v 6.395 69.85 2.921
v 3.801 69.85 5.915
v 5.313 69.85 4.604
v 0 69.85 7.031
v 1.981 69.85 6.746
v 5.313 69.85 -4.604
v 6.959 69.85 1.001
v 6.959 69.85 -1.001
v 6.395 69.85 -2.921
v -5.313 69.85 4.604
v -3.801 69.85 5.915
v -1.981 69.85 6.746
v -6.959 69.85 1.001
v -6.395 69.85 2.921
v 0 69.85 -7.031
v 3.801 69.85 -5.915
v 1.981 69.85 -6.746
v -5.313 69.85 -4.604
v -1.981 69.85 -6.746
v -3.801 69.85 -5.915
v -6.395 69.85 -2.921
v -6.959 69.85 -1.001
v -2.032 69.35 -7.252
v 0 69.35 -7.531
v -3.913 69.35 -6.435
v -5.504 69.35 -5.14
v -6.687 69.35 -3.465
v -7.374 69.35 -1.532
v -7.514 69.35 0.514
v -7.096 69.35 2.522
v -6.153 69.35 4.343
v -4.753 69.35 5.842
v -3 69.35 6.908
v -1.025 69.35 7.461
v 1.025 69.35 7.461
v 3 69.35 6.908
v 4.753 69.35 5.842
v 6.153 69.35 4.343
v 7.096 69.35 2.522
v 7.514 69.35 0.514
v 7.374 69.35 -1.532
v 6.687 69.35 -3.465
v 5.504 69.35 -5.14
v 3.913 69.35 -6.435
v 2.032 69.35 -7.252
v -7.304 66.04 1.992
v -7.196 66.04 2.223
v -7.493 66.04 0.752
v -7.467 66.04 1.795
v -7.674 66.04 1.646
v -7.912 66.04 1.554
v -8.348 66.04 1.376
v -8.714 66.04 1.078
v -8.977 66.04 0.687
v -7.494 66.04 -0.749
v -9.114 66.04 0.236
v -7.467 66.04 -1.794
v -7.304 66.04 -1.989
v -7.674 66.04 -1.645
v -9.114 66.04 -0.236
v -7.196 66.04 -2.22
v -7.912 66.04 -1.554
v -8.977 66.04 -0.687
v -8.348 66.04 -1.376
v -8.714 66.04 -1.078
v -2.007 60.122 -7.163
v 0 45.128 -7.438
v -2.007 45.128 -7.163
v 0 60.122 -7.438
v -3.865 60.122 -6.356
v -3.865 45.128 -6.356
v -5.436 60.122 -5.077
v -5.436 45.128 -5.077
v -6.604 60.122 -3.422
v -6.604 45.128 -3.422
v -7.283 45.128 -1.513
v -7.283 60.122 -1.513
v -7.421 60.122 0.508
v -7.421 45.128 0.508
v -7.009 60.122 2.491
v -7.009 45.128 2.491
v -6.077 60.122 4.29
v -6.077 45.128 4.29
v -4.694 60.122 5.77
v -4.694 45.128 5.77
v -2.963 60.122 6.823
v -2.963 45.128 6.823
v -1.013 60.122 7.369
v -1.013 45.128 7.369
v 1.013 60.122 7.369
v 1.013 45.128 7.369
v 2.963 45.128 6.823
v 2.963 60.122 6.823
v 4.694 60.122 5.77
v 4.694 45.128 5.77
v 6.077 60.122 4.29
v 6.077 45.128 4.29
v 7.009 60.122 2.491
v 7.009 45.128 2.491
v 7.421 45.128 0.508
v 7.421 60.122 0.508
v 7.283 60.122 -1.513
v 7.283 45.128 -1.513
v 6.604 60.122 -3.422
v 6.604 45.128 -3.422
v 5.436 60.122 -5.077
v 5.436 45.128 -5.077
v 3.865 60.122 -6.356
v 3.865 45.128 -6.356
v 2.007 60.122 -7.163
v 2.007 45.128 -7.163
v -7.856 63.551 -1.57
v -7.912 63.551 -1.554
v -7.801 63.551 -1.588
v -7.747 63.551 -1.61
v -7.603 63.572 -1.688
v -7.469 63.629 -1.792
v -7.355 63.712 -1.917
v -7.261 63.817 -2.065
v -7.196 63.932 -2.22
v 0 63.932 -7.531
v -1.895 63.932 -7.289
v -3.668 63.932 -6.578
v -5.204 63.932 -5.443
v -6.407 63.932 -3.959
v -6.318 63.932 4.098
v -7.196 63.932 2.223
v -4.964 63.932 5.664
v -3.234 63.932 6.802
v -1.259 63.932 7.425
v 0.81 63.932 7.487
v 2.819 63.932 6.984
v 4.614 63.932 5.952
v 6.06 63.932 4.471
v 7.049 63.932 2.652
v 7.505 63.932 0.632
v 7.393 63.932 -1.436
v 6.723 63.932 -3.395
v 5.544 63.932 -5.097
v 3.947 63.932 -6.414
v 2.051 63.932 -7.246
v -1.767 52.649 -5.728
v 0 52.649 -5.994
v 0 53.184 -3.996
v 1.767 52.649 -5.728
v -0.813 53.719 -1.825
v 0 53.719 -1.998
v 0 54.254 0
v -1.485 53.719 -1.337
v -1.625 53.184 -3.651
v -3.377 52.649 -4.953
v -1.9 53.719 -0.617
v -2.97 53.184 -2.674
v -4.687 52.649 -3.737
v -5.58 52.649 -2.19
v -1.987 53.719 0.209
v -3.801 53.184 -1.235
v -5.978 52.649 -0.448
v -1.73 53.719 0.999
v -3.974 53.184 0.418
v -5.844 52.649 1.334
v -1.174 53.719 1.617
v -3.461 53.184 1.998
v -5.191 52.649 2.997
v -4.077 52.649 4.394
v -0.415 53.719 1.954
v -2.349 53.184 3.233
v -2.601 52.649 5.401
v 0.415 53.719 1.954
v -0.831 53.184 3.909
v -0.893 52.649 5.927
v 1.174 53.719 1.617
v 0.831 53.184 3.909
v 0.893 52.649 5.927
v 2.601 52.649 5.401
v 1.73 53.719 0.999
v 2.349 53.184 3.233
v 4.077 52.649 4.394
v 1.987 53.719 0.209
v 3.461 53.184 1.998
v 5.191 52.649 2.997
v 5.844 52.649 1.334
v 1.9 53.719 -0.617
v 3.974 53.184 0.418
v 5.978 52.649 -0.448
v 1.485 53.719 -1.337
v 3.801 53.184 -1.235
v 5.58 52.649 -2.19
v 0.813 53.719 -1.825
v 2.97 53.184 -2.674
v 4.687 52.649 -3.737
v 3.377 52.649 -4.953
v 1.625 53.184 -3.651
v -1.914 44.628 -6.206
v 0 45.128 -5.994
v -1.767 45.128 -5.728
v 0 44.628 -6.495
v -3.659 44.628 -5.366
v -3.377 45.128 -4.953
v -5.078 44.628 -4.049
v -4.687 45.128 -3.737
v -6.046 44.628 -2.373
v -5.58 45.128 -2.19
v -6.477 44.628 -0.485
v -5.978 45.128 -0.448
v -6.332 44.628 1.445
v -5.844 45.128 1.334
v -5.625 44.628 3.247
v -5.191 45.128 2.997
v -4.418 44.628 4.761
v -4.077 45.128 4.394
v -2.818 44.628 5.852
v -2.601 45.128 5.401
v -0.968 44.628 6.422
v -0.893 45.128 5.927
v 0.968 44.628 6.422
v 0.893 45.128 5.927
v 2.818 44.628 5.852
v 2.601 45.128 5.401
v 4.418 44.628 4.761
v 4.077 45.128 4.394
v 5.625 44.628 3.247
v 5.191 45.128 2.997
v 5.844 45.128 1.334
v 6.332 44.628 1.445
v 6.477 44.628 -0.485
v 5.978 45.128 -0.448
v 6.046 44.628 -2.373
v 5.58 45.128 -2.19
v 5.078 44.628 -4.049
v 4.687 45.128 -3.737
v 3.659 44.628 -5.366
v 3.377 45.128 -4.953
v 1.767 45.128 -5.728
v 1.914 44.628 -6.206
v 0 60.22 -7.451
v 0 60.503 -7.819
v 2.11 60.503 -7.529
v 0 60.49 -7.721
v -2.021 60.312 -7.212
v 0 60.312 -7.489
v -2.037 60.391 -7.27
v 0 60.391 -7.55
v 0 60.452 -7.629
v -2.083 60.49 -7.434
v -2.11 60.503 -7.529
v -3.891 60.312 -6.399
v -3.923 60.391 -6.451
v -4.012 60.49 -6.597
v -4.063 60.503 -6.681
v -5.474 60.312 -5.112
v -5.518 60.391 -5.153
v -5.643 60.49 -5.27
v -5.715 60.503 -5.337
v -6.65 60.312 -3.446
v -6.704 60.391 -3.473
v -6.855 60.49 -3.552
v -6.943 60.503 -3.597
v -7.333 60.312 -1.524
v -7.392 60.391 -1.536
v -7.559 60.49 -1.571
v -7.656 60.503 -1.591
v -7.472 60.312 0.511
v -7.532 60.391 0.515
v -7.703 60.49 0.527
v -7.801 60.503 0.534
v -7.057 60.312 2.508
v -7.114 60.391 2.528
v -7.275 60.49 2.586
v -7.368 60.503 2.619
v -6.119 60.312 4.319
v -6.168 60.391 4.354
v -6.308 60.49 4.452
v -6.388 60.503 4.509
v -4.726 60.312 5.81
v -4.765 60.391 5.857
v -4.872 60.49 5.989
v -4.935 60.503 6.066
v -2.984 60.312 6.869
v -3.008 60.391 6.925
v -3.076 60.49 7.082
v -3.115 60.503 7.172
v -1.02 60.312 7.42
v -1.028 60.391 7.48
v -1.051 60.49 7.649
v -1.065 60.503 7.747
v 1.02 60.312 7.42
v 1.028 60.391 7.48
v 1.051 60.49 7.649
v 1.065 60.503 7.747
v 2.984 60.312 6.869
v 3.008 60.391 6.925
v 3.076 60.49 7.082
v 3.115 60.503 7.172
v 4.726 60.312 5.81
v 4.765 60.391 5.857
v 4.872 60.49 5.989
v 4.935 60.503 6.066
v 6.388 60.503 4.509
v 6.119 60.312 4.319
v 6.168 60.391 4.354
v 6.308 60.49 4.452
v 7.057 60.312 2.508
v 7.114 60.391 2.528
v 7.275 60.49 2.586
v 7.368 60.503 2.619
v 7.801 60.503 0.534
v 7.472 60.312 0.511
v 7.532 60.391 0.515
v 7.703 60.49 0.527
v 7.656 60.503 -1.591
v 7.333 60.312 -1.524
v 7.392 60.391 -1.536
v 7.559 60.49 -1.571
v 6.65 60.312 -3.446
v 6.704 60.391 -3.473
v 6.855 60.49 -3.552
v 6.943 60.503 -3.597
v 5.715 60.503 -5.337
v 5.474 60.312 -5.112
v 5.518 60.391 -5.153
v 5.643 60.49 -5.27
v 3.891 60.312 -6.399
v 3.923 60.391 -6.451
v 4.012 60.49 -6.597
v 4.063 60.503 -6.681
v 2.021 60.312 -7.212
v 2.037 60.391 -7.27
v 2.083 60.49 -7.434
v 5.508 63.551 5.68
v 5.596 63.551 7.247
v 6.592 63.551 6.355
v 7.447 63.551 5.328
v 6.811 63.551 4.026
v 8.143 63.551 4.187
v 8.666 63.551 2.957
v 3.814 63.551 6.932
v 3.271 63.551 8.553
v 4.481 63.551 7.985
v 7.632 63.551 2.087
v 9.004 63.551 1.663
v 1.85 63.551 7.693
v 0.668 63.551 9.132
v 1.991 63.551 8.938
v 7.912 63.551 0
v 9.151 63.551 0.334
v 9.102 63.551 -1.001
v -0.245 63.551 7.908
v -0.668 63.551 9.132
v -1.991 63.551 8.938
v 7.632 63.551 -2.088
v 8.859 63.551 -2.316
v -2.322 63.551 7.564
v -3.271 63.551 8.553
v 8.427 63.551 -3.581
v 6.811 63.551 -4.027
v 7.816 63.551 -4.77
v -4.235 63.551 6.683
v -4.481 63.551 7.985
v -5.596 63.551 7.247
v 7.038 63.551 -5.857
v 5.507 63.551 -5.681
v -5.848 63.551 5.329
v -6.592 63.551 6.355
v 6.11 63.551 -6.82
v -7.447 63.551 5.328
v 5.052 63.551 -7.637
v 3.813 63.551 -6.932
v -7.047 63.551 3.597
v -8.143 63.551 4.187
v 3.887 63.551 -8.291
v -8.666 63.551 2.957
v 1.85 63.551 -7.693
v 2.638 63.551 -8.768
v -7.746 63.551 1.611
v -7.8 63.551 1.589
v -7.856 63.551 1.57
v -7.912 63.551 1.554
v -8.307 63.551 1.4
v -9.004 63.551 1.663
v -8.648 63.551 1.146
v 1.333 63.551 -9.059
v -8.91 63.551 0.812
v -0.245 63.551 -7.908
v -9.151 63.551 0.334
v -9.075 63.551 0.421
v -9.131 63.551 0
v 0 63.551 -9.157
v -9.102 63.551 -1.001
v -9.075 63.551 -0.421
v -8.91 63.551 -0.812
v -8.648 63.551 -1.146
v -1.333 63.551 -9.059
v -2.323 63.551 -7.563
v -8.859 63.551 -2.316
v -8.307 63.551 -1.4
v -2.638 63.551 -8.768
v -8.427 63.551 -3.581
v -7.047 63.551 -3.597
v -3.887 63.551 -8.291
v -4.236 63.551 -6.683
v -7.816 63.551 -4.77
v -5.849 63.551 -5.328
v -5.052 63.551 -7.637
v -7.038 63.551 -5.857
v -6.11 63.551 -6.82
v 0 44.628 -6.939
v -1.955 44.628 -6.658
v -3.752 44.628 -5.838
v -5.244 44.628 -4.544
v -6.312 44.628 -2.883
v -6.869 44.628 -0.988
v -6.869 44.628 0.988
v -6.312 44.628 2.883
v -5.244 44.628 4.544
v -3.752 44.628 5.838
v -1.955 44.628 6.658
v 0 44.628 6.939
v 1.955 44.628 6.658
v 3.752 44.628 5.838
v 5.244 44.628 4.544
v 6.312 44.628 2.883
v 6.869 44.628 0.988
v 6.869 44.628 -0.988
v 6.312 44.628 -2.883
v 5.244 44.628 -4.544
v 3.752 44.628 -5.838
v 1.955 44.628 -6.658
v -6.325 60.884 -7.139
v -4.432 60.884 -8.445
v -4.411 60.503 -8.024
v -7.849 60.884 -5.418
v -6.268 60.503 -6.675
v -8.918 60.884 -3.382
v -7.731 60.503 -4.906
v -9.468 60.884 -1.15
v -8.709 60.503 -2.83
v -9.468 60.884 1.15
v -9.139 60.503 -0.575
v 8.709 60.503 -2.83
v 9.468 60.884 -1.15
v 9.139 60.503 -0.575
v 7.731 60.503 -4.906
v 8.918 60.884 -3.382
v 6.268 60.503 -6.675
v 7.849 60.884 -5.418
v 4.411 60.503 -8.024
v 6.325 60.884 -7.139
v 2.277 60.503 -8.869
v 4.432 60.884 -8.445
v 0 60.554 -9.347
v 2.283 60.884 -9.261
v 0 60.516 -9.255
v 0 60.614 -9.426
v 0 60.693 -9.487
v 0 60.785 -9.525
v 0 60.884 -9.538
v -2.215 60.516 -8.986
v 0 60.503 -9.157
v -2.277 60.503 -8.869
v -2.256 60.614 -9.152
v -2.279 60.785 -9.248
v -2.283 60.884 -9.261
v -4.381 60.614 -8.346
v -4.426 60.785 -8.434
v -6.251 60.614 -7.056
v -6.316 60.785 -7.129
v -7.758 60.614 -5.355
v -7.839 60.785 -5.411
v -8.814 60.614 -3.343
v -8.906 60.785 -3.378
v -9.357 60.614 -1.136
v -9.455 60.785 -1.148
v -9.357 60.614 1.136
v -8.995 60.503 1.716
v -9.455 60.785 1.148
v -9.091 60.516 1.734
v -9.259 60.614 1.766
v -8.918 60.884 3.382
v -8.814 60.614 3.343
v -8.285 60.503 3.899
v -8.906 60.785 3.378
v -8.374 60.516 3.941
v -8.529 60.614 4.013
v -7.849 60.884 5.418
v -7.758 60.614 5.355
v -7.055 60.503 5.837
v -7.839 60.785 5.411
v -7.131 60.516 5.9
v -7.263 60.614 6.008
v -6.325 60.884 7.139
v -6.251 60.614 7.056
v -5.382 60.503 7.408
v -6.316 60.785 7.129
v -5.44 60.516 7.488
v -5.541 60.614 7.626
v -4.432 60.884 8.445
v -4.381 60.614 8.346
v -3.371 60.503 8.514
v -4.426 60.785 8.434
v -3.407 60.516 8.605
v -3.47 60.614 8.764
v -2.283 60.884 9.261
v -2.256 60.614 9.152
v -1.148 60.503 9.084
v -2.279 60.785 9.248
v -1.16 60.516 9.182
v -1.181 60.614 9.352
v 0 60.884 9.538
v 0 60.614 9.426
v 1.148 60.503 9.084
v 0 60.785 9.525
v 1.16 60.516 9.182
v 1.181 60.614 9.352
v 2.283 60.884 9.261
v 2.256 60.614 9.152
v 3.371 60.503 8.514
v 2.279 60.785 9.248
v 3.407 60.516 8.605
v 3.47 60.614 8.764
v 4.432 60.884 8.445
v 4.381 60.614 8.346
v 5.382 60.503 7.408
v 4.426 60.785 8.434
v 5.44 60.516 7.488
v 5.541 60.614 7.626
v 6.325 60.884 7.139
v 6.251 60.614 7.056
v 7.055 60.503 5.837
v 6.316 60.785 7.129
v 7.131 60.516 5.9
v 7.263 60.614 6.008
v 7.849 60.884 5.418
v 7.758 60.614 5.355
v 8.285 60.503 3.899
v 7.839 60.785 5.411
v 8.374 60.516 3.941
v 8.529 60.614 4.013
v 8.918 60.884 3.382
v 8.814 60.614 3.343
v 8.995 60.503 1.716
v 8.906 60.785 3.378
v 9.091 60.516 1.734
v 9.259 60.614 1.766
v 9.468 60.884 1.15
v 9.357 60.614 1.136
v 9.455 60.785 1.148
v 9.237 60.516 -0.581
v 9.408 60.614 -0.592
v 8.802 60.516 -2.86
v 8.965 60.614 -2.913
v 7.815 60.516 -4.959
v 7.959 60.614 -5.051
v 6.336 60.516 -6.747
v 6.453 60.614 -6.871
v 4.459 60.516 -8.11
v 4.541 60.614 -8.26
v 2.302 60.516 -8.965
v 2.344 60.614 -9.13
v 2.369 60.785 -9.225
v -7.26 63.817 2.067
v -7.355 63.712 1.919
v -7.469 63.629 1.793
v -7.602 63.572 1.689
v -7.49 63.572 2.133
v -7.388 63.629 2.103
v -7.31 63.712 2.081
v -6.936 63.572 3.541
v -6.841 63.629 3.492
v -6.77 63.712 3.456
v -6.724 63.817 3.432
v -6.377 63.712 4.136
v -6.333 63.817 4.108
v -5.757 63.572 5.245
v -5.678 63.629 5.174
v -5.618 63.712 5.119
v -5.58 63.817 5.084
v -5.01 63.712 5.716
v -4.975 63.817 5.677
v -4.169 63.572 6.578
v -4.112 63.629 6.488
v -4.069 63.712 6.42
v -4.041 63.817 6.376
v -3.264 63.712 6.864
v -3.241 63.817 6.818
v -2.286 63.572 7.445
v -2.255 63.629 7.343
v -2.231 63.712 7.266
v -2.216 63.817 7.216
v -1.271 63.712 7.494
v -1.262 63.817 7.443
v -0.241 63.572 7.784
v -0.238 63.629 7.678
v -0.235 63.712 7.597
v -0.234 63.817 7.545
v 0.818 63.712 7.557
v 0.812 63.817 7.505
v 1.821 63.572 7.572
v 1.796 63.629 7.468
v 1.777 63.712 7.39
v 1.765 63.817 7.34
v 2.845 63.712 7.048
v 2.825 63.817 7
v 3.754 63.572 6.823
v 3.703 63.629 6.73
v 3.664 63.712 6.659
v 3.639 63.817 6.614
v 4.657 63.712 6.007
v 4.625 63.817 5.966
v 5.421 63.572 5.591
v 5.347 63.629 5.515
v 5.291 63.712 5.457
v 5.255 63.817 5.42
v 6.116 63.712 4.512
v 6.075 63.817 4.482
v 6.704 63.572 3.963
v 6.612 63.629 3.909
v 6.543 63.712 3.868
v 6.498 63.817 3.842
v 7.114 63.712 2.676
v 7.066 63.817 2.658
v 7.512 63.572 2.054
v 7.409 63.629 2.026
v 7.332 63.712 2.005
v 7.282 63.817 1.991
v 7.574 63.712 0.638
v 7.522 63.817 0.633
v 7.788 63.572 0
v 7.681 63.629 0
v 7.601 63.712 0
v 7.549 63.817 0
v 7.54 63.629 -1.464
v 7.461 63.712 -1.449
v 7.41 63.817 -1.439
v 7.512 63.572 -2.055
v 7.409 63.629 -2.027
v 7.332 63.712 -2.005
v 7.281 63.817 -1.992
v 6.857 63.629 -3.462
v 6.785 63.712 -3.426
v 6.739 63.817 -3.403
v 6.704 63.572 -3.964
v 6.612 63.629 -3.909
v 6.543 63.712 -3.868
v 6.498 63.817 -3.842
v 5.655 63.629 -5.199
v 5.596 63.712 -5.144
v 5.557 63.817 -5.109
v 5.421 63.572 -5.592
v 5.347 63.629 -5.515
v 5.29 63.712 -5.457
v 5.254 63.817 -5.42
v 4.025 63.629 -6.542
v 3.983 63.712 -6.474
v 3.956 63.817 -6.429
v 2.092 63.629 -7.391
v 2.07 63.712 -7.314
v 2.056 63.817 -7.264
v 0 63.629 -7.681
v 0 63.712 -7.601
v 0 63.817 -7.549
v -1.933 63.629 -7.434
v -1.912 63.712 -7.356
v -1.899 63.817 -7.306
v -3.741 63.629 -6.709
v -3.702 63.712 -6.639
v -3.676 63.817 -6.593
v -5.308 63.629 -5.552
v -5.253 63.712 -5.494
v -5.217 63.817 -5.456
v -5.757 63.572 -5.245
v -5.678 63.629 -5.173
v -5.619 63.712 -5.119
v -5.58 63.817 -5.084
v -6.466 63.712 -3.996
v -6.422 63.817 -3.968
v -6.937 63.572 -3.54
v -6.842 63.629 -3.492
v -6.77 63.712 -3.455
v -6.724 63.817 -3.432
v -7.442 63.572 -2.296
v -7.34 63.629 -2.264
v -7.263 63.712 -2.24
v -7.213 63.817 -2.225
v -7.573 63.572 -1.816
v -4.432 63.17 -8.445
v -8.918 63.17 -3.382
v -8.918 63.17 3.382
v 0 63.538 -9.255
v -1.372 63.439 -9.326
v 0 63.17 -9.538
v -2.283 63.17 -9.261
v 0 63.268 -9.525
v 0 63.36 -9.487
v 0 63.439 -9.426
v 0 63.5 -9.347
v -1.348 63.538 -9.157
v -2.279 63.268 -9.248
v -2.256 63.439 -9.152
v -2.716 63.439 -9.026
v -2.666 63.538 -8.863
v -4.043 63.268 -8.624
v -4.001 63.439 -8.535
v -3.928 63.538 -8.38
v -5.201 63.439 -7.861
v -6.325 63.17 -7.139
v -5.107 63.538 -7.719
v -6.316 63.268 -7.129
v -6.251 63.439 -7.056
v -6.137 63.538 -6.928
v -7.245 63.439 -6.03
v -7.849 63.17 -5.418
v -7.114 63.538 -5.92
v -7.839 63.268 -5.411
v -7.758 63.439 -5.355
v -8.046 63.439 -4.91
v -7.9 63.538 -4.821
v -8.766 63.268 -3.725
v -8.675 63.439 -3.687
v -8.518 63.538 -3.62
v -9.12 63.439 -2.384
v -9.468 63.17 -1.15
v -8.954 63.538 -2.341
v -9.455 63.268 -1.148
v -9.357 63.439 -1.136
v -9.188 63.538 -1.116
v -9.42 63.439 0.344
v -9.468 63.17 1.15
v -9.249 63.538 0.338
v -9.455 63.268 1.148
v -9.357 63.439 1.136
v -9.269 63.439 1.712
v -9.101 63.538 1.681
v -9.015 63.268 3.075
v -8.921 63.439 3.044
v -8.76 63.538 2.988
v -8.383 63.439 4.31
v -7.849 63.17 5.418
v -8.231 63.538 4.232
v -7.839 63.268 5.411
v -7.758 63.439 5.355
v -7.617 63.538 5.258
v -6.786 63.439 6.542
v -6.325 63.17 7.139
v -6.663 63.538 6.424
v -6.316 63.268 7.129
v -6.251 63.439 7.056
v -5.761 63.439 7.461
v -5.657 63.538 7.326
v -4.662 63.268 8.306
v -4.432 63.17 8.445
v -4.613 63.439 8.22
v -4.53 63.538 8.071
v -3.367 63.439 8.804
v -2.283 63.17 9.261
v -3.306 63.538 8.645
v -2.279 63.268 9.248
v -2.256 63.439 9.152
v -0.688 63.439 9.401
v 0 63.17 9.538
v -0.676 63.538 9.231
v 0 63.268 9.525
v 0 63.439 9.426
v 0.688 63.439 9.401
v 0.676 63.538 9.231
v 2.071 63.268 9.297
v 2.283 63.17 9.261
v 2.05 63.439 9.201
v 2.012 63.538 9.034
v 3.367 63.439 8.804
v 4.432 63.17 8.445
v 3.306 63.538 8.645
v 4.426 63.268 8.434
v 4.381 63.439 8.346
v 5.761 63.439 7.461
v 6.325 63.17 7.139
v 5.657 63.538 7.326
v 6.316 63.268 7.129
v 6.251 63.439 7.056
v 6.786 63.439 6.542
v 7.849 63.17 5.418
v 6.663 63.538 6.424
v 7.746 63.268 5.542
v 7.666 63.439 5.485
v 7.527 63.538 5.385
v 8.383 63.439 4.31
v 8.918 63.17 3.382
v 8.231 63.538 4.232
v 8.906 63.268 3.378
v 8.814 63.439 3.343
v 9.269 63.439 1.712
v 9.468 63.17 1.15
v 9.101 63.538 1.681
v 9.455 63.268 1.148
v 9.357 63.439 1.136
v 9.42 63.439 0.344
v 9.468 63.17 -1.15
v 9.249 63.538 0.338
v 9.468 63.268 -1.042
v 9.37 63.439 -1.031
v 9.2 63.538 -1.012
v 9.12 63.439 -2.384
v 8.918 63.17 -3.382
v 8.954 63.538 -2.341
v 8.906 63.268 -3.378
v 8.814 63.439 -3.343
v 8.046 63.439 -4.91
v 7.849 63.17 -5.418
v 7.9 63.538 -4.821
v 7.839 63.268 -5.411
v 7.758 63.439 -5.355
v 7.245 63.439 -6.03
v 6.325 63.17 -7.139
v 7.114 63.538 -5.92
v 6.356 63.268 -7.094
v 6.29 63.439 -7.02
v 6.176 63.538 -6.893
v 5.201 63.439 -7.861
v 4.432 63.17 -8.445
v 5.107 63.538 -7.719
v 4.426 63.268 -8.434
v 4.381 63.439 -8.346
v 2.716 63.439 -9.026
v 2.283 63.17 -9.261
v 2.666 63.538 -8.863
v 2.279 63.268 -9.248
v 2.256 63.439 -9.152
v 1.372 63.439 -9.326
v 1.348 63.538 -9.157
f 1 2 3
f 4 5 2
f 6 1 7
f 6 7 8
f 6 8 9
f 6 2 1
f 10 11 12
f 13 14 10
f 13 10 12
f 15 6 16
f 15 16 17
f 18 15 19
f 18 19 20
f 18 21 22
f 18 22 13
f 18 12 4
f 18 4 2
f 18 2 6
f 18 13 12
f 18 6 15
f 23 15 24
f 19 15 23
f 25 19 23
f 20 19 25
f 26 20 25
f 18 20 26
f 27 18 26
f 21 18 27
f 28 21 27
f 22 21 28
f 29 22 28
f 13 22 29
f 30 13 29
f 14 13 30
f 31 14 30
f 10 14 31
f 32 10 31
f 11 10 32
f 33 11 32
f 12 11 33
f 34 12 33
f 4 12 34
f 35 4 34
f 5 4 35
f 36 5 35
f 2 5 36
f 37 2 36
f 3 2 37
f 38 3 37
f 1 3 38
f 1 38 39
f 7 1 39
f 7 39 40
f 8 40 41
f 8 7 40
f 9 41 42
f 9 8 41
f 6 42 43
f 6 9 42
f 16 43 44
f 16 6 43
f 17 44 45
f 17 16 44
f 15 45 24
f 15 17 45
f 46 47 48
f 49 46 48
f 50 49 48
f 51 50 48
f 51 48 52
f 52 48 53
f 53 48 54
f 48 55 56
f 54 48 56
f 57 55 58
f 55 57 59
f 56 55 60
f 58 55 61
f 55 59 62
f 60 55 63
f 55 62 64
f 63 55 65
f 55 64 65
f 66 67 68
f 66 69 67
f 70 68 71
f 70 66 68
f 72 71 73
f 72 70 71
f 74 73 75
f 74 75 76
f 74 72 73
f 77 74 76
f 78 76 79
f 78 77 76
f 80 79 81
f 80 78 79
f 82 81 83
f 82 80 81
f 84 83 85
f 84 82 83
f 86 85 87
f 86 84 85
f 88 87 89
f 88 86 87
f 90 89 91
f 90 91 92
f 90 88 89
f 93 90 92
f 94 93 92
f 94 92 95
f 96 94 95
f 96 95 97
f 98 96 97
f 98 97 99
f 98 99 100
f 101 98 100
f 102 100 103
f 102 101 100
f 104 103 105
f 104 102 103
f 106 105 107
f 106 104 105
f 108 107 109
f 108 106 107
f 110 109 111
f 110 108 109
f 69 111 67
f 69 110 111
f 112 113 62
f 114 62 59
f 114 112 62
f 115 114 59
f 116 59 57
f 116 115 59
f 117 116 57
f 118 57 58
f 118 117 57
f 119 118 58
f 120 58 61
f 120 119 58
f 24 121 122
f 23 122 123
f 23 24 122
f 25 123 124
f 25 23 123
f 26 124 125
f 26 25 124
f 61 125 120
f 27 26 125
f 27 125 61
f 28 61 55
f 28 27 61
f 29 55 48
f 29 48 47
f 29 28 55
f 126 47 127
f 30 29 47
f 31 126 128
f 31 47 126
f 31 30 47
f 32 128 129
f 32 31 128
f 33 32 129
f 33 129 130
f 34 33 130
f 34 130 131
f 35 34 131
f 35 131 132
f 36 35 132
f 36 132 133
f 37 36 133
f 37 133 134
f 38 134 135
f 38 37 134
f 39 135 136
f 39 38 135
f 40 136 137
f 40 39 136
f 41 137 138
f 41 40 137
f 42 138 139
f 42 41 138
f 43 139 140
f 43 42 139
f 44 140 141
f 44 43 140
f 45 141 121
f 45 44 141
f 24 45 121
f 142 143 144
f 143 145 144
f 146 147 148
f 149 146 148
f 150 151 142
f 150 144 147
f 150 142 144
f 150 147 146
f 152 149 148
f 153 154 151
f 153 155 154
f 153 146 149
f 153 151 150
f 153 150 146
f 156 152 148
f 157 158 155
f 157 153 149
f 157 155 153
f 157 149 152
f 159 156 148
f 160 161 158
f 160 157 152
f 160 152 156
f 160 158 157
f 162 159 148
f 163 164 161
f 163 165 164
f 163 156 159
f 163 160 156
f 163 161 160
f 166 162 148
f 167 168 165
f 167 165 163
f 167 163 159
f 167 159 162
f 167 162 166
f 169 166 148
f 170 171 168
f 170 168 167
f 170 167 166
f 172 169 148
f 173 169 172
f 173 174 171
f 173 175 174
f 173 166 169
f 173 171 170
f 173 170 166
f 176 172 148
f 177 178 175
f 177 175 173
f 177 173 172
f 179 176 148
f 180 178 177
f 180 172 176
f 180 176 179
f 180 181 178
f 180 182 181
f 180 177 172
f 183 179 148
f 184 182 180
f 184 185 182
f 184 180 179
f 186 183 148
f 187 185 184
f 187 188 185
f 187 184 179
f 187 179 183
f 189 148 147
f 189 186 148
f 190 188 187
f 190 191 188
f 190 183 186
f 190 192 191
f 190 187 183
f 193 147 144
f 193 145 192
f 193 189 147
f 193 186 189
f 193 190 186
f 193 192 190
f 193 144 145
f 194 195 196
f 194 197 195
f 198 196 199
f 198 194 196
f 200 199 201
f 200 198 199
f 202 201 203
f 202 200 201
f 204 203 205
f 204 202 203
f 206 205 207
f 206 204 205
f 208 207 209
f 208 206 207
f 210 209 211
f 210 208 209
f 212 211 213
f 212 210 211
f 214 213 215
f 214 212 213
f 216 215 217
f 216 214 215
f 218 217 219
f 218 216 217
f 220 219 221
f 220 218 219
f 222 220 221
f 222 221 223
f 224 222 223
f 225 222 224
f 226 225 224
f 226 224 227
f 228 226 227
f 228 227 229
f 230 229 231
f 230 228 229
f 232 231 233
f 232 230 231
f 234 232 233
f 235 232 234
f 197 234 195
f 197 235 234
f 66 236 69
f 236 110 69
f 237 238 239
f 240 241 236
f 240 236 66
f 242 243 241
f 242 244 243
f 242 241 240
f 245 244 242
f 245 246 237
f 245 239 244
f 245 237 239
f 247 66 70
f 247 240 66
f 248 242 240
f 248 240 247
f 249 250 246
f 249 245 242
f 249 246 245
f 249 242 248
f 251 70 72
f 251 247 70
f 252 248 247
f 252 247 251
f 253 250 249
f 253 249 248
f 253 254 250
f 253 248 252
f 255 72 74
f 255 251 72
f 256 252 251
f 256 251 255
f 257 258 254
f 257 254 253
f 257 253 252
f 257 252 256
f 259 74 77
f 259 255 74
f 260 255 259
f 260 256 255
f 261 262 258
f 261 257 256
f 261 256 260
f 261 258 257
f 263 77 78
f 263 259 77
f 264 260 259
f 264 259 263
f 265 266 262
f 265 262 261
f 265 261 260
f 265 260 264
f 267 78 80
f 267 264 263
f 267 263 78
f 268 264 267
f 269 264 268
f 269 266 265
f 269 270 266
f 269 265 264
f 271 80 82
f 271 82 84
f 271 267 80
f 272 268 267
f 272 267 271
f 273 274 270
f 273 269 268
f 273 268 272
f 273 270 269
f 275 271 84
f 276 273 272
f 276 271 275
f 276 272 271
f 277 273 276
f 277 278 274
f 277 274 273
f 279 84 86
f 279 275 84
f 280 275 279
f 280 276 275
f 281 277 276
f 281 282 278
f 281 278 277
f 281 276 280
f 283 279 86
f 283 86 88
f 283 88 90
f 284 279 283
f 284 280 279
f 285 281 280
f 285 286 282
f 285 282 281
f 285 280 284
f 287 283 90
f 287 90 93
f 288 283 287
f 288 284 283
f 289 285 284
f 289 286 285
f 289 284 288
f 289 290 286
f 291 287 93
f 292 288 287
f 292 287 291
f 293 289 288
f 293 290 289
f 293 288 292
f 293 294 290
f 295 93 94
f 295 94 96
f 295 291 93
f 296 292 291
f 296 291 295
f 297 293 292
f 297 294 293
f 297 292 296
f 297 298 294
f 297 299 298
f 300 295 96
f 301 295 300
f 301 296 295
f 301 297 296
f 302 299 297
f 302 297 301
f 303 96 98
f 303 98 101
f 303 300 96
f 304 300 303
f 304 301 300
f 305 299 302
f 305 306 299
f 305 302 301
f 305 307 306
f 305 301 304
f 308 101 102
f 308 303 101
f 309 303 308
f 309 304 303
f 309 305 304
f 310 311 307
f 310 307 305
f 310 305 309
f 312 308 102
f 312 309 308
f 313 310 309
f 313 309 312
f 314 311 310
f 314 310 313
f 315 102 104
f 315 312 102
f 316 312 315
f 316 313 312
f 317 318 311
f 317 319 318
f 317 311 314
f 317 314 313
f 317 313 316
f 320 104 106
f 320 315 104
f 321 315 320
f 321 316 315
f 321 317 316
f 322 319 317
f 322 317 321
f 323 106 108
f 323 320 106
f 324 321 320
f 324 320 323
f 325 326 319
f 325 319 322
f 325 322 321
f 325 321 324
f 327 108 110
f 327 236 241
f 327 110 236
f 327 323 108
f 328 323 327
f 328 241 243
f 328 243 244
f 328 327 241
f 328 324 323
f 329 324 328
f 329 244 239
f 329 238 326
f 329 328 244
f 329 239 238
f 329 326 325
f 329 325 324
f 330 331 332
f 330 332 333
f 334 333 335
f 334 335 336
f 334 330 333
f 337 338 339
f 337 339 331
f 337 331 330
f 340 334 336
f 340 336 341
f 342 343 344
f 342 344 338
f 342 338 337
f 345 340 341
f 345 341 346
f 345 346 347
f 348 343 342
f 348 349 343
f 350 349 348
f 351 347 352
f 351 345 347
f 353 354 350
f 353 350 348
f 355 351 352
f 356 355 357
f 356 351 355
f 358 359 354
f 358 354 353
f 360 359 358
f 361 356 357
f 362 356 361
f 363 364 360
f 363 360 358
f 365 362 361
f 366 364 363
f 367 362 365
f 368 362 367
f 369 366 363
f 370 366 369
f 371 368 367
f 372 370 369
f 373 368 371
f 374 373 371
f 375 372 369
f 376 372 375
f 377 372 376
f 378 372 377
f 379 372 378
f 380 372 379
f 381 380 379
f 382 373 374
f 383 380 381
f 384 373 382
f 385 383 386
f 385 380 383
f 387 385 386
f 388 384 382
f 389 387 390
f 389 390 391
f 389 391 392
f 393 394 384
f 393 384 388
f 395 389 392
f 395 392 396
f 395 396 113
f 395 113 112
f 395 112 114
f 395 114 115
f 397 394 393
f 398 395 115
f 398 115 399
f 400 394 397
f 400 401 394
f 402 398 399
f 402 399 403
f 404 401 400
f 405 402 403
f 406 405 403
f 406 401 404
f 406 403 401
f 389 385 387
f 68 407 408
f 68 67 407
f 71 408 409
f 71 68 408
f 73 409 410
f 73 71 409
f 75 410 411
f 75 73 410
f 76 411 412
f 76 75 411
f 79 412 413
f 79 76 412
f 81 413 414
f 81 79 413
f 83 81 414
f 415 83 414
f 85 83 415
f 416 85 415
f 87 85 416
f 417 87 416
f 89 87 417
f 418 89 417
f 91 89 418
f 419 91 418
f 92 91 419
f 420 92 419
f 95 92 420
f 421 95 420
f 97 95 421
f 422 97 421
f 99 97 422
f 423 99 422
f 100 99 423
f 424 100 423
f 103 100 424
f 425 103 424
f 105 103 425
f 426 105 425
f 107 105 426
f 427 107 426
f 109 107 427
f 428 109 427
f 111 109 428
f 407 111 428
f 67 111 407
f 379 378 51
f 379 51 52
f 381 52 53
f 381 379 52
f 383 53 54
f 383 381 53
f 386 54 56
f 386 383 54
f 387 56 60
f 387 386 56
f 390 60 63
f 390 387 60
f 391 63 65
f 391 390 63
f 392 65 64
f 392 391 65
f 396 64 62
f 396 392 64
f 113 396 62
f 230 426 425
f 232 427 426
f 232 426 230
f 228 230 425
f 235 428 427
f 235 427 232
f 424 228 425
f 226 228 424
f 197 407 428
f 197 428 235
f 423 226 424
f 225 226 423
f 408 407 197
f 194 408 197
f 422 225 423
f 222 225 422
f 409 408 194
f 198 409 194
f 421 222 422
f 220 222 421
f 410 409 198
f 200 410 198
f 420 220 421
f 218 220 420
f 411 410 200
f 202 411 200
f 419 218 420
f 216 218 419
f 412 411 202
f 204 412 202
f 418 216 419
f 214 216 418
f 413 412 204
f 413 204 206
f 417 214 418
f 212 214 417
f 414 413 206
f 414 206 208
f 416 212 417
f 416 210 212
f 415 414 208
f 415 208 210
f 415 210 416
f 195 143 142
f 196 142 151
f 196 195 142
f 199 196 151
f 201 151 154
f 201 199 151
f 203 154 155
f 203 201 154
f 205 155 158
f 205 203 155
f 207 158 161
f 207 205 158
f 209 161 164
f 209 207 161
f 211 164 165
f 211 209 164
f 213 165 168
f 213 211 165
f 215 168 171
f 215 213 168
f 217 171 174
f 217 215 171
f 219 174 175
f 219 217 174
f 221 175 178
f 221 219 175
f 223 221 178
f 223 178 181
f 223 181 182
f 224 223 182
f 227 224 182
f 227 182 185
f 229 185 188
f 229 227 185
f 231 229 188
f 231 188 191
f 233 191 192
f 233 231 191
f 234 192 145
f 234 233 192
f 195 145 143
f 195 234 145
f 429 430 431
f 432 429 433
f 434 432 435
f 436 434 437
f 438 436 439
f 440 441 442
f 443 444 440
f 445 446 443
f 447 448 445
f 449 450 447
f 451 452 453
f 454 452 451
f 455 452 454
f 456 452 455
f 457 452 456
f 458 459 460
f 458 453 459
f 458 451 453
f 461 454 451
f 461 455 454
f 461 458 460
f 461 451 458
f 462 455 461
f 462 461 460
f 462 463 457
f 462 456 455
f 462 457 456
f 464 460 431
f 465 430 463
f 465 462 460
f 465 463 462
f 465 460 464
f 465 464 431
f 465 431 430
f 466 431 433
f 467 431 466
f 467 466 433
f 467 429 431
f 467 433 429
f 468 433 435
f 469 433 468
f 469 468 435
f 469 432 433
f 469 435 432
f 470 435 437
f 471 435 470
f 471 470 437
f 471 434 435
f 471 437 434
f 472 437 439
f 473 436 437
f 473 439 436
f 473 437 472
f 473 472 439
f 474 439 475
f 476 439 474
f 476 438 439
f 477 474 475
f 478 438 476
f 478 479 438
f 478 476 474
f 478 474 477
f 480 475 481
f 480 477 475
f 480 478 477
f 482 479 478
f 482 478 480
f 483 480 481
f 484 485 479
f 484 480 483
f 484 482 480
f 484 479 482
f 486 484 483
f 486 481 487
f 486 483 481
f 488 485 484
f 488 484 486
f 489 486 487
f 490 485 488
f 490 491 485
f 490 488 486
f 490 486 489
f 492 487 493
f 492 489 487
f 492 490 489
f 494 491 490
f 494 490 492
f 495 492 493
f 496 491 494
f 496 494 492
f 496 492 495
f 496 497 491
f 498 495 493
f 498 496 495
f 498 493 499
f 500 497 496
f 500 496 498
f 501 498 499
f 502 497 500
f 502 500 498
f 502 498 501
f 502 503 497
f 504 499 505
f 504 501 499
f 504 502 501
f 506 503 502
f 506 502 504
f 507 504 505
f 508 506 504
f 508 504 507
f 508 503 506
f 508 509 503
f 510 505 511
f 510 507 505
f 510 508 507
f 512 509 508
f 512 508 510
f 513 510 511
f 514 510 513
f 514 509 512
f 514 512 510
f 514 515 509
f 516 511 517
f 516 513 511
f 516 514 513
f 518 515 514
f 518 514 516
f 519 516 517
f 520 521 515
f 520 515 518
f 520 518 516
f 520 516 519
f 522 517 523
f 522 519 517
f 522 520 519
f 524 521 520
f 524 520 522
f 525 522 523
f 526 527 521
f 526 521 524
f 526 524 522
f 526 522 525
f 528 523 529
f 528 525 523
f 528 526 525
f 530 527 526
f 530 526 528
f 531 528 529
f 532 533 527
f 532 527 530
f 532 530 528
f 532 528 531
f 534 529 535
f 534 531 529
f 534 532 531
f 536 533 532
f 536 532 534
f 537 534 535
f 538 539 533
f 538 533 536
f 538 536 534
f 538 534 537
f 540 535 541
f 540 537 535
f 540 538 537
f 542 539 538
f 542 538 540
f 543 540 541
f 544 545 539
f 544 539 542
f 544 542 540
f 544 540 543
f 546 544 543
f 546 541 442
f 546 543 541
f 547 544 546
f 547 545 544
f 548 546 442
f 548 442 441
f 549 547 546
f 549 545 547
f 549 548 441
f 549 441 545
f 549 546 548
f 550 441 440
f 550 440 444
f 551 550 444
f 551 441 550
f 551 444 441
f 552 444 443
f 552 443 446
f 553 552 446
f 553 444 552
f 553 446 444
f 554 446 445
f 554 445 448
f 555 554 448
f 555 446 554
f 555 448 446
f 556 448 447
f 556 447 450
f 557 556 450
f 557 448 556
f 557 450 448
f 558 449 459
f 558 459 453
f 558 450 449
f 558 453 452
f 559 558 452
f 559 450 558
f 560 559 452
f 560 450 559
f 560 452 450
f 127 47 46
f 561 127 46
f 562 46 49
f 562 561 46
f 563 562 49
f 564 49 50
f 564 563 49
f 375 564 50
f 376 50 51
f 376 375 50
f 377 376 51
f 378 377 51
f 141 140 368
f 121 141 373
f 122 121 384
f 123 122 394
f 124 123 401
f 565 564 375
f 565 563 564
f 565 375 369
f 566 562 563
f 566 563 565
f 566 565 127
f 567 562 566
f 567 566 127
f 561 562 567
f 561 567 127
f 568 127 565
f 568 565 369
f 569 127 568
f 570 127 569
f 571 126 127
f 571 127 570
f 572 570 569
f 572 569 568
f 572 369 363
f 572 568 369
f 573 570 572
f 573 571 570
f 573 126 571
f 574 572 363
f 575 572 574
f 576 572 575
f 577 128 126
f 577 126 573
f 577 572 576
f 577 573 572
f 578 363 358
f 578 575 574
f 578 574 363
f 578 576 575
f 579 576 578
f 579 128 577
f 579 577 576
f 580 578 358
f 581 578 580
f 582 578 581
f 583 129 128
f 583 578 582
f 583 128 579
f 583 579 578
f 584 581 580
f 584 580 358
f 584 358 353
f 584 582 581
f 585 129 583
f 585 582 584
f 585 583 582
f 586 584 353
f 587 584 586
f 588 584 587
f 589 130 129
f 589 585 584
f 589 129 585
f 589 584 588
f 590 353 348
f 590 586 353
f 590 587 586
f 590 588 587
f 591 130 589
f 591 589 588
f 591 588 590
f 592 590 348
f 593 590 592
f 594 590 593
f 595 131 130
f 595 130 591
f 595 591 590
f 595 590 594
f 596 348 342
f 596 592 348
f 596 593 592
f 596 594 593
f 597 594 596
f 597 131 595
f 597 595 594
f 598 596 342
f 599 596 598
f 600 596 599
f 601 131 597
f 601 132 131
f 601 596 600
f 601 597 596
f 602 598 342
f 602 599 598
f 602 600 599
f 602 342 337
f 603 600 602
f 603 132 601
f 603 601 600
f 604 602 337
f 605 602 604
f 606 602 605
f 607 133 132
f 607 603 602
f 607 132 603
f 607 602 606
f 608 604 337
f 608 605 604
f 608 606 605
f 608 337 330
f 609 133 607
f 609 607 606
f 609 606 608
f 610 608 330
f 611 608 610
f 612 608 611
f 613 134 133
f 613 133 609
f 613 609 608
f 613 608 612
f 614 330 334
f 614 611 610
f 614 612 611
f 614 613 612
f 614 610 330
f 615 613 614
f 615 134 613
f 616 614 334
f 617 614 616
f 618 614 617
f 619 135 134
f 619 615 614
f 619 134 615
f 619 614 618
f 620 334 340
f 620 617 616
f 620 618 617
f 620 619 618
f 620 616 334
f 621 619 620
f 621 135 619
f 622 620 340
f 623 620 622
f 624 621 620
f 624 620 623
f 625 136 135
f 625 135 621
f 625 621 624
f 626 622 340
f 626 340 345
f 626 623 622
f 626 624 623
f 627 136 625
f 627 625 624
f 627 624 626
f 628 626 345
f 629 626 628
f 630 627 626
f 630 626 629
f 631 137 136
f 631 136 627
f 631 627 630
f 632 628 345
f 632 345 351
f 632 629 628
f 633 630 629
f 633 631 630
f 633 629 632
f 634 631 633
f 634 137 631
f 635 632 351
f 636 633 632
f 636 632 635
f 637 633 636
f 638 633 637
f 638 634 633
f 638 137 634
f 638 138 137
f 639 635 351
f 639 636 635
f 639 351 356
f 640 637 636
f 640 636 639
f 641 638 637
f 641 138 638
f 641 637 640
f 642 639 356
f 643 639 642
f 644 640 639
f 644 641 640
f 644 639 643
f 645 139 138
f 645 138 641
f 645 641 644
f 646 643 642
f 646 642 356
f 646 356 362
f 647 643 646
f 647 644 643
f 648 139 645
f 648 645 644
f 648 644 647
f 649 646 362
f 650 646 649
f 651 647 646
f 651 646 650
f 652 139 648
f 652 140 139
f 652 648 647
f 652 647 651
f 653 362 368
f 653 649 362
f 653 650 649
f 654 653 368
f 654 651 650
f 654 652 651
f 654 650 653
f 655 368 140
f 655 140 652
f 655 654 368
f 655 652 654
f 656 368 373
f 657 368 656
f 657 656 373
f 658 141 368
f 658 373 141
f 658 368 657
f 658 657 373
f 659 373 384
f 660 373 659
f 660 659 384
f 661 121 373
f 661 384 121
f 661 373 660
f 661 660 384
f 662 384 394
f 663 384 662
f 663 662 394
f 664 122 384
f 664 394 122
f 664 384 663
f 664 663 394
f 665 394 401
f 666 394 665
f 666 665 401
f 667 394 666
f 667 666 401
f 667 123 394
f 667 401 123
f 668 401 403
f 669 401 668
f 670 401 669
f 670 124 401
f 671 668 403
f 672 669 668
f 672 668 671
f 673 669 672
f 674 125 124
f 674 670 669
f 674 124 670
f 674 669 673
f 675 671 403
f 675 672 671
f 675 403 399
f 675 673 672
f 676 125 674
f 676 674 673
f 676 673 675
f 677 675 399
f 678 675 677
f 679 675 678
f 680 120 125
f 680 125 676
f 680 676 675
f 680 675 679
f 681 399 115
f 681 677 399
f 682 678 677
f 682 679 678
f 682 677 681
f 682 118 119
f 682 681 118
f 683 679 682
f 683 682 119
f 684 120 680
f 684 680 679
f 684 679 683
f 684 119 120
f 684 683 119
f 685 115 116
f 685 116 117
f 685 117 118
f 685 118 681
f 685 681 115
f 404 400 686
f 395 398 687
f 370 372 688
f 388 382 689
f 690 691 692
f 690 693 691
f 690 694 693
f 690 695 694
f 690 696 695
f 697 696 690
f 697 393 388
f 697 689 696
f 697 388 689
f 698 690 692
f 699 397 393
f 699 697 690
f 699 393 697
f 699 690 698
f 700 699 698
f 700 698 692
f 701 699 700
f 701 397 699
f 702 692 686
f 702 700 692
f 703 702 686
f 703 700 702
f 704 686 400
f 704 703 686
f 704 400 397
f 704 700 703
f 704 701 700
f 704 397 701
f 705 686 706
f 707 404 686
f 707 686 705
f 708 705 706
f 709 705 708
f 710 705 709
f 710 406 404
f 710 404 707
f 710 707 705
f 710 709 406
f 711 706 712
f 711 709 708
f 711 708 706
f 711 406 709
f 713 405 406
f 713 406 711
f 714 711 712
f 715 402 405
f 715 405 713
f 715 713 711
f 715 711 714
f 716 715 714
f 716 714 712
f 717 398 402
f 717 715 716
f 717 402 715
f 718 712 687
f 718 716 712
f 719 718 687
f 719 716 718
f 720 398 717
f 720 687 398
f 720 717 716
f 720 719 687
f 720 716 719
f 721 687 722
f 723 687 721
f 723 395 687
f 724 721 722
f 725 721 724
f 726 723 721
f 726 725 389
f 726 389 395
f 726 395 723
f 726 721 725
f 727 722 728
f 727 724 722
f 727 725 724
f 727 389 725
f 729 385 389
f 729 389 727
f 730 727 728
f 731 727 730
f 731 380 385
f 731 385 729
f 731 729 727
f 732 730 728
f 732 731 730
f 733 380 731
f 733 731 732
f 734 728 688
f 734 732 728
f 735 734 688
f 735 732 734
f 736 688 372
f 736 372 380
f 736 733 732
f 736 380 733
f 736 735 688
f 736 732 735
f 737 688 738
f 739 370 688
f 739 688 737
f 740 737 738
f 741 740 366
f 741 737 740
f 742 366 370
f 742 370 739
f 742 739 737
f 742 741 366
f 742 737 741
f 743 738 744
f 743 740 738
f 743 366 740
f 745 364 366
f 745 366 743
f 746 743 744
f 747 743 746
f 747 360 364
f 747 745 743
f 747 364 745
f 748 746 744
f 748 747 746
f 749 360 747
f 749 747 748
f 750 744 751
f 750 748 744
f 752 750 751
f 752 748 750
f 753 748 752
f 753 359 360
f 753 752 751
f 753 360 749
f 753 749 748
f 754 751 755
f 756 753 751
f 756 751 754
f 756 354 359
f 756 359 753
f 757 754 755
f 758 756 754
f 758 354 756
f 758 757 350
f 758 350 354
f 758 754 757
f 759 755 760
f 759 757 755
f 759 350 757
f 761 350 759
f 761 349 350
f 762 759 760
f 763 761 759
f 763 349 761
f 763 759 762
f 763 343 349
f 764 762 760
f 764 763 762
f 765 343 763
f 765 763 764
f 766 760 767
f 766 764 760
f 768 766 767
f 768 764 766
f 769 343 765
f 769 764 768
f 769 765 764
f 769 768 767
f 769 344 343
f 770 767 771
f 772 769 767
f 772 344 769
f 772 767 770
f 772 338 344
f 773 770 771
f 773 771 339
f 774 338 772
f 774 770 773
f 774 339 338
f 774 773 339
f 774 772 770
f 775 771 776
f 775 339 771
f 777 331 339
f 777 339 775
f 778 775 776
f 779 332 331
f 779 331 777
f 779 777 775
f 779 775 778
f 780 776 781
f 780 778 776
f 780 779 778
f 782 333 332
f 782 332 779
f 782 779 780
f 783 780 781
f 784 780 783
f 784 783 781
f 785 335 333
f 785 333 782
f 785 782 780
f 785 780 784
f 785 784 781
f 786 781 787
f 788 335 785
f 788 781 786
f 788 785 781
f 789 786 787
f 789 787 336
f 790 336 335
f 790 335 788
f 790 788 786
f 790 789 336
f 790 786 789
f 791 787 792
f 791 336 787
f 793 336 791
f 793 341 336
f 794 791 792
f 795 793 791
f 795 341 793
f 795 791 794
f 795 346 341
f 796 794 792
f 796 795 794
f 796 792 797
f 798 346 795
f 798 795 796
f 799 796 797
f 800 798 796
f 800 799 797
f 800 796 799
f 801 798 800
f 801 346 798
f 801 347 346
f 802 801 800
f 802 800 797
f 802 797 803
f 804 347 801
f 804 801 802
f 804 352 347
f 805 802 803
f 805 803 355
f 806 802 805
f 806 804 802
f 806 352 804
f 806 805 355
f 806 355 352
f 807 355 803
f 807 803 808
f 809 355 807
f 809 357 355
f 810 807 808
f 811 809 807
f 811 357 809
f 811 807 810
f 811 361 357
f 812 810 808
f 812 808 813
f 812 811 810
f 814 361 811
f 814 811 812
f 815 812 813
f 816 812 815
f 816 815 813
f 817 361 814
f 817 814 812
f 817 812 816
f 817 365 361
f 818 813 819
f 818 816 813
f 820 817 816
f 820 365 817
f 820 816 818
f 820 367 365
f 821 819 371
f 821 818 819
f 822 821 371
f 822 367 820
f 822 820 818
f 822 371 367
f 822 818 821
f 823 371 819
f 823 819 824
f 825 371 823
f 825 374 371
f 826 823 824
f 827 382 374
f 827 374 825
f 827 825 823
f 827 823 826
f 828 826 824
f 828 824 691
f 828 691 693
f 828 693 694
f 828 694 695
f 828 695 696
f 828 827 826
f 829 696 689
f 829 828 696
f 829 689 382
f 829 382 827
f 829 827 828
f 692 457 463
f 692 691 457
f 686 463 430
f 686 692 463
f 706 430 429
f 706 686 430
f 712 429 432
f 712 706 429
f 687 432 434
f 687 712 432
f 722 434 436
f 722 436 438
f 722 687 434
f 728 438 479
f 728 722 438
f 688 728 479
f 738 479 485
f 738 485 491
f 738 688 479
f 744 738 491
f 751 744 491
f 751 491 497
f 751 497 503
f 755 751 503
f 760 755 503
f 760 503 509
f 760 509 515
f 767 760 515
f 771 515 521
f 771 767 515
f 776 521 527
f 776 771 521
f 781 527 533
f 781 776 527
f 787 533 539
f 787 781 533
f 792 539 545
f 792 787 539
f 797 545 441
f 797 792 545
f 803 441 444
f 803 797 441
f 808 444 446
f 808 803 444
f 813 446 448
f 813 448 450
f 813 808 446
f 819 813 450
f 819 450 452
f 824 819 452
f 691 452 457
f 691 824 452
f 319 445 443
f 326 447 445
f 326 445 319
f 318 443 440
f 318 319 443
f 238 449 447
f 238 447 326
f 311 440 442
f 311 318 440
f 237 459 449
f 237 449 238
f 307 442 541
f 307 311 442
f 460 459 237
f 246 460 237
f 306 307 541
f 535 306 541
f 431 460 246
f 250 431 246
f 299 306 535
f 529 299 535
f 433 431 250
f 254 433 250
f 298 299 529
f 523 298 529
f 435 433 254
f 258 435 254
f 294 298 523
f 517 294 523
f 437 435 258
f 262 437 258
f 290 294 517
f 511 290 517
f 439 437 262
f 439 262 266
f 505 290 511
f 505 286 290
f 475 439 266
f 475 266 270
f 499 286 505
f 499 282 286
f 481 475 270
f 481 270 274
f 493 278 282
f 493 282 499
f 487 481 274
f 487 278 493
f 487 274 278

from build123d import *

# Parameters (mm, degrees)
EXT_LUG_DEPTH = 2.4892


with BuildPart() as part:
    # Sk_kingpin_section → Rev_kingpin (revolve)
    with BuildSketch(Plane.XY, mode=Mode.PRIVATE) as rev_kingpin_sk:
        with BuildLine():
            Line((0, 54.2544), (5.9944, 52.64912))
            Line((5.9944, 52.64912), (5.9944, 45.12818))
            Line((5.9944, 45.12818), (6.49478, 44.6278))
            Line((6.49478, 44.6278), (6.93928, 44.6278))
            Line((6.93928, 44.6278), (7.43839, 45.12818))
            Line((7.43839, 45.12818), (7.43839, 60.1218))
            ThreePointArc((7.43839, 60.1218), (7.549982316, 60.391207684), (7.81939, 60.5028))
            Line((7.81939, 60.5028), (9.1567, 60.5028))
            ThreePointArc((9.1567, 60.5028), (9.426107684, 60.614392316), (9.5377, 60.8838))
            Line((9.5377, 60.8838), (9.5377, 63.1698))
            ThreePointArc((9.5377, 63.1698), (9.426107684, 63.439207684), (9.1567, 63.5508))
            Line((9.1567, 63.5508), (7.9121, 63.5508))
            ThreePointArc((7.9121, 63.5508), (7.642692316, 63.662392316), (7.5311, 63.9318))
            Line((7.5311, 63.9318), (7.5311, 69.34962))
            Line((7.5311, 69.34962), (7.03072, 69.85))
            Line((7.03072, 69.85), (0, 69.85))
            Line((0, 69.85), (0, 54.2544))
        make_face()
    revolve(rev_kingpin_sk.sketch.rotate(Axis((0, -25.4, 0), (0, 1, 0)), 90), axis=Axis((0, -25.4, 0), (0, 1, 0)))

    # Sk_lug → Ext_lug (add)
    with BuildSketch(Plane(origin=(0, 63.5508, 0), x_dir=(1, 0, 0), z_dir=(0, 1, 0))):
        with BuildLine():
            Line((-7.19328, 2.23012), (-7.19328, -2.23012))
            ThreePointArc((-7.19328, -2.23012), (-7.46394509, -1.797883422), (-7.9121, -1.55448))
            ThreePointArc((-7.9121, -1.55448), (-9.1313, 0), (-7.9121, 1.55448))
            ThreePointArc((-7.9121, 1.55448), (-7.463342343, 1.797242155), (-7.19328, 2.23012))
        make_face()
    extrude(amount=EXT_LUG_DEPTH)


solid = part.part
